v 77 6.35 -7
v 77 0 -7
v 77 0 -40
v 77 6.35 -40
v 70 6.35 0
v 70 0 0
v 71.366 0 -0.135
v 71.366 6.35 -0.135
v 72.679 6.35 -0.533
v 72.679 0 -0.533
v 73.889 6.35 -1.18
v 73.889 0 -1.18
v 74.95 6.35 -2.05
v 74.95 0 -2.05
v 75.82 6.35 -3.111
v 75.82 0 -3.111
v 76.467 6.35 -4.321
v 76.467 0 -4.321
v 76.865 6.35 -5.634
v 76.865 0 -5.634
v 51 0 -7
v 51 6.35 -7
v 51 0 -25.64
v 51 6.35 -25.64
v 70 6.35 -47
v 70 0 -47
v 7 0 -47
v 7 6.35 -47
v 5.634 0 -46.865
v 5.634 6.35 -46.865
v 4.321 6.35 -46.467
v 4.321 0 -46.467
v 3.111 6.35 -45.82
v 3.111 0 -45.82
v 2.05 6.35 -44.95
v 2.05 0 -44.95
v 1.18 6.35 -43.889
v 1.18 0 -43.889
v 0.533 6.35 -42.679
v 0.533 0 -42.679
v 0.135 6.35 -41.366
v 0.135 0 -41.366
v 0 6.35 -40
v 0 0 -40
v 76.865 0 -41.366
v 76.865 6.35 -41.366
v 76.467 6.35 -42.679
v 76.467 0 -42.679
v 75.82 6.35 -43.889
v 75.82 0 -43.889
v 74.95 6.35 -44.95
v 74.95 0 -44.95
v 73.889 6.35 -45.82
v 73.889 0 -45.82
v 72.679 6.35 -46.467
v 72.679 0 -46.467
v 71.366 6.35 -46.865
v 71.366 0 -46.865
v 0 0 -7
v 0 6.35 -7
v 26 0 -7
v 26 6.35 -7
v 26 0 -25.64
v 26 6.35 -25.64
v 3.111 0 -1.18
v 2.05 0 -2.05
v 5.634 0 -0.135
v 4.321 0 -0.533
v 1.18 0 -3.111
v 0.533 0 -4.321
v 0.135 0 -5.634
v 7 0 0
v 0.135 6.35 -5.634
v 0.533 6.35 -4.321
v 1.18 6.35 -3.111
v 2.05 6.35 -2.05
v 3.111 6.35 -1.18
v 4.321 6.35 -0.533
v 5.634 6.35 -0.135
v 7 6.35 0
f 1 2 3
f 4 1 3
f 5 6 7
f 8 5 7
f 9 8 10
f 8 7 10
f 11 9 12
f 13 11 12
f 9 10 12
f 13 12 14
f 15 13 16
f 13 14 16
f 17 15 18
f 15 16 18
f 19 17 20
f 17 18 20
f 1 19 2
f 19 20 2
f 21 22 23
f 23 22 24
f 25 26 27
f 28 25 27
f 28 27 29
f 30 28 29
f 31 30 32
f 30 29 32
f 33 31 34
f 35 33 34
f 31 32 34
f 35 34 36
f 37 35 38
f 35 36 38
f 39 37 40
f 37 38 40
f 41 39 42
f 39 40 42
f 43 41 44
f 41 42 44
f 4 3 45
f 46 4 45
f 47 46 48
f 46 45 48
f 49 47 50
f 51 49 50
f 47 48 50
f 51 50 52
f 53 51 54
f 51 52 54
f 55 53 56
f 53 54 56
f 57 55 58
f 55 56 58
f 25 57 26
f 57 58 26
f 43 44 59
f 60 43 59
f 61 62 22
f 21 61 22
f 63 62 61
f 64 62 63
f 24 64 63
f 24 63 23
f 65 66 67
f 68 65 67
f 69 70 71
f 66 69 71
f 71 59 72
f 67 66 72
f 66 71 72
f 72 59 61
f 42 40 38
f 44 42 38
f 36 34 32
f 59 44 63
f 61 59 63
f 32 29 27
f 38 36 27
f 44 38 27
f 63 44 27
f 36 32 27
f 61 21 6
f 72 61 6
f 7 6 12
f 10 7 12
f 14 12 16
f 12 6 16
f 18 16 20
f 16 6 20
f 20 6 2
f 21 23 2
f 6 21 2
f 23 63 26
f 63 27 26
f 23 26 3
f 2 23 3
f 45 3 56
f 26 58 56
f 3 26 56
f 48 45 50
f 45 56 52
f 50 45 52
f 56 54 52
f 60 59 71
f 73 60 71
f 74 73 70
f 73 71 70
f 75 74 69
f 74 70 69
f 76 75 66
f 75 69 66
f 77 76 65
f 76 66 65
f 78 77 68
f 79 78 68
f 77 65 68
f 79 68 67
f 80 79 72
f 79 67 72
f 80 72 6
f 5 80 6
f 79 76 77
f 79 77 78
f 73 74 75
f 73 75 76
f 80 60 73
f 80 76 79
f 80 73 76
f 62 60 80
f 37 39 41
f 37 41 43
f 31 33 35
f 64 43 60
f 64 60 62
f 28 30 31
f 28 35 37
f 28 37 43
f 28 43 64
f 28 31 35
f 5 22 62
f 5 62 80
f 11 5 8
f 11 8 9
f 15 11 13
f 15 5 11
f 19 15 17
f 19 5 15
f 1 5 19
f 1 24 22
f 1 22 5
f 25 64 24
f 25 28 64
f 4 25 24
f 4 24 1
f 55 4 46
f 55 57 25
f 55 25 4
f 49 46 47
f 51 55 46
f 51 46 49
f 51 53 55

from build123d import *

# Parameters (mm, degrees)
BOSS_EXTRUDE1_DEPTH = 6.35
SKETCH2_W           = 25
SKETCH2_H           = 18.64
CUT_EXTRUDE1_DEPTH  = 91.434078201


with BuildPart() as part:
    # Sketch1 → Boss-Extrude1 (new body)
    with BuildSketch(Plane(origin=(0, 0, 0), x_dir=(1, 0, 0), z_dir=(0, 1, 0))):
        with BuildLine():
            Line((7, 0), (70, 0))
            ThreePointArc((70, 0), (74.949747468, 2.050252532), (77, 7))
            Line((77, 7), (77, 40))
            ThreePointArc((77, 40), (74.949747468, 44.949747468), (70, 47))
            Line((70, 47), (7, 47))
            ThreePointArc((7, 47), (2.050252532, 44.949747468), (0, 40))
            Line((0, 40), (0, 7))
            ThreePointArc((0, 7), (2.050252532, 2.050252532), (7, 0))
        make_face()
    extrude(amount=BOSS_EXTRUDE1_DEPTH)

    # Sketch2 → Cut-Extrude1 (cut, through all)
    with BuildSketch(Plane(origin=(0, 6.35, 0), x_dir=(1, 0, 0), z_dir=(0, 1, 0))):
        with Locations((38.5, 16.32)):
            Rectangle(SKETCH2_W, SKETCH2_H)
    extrude(amount=-CUT_EXTRUDE1_DEPTH, mode=Mode.SUBTRACT)


solid = part.part
